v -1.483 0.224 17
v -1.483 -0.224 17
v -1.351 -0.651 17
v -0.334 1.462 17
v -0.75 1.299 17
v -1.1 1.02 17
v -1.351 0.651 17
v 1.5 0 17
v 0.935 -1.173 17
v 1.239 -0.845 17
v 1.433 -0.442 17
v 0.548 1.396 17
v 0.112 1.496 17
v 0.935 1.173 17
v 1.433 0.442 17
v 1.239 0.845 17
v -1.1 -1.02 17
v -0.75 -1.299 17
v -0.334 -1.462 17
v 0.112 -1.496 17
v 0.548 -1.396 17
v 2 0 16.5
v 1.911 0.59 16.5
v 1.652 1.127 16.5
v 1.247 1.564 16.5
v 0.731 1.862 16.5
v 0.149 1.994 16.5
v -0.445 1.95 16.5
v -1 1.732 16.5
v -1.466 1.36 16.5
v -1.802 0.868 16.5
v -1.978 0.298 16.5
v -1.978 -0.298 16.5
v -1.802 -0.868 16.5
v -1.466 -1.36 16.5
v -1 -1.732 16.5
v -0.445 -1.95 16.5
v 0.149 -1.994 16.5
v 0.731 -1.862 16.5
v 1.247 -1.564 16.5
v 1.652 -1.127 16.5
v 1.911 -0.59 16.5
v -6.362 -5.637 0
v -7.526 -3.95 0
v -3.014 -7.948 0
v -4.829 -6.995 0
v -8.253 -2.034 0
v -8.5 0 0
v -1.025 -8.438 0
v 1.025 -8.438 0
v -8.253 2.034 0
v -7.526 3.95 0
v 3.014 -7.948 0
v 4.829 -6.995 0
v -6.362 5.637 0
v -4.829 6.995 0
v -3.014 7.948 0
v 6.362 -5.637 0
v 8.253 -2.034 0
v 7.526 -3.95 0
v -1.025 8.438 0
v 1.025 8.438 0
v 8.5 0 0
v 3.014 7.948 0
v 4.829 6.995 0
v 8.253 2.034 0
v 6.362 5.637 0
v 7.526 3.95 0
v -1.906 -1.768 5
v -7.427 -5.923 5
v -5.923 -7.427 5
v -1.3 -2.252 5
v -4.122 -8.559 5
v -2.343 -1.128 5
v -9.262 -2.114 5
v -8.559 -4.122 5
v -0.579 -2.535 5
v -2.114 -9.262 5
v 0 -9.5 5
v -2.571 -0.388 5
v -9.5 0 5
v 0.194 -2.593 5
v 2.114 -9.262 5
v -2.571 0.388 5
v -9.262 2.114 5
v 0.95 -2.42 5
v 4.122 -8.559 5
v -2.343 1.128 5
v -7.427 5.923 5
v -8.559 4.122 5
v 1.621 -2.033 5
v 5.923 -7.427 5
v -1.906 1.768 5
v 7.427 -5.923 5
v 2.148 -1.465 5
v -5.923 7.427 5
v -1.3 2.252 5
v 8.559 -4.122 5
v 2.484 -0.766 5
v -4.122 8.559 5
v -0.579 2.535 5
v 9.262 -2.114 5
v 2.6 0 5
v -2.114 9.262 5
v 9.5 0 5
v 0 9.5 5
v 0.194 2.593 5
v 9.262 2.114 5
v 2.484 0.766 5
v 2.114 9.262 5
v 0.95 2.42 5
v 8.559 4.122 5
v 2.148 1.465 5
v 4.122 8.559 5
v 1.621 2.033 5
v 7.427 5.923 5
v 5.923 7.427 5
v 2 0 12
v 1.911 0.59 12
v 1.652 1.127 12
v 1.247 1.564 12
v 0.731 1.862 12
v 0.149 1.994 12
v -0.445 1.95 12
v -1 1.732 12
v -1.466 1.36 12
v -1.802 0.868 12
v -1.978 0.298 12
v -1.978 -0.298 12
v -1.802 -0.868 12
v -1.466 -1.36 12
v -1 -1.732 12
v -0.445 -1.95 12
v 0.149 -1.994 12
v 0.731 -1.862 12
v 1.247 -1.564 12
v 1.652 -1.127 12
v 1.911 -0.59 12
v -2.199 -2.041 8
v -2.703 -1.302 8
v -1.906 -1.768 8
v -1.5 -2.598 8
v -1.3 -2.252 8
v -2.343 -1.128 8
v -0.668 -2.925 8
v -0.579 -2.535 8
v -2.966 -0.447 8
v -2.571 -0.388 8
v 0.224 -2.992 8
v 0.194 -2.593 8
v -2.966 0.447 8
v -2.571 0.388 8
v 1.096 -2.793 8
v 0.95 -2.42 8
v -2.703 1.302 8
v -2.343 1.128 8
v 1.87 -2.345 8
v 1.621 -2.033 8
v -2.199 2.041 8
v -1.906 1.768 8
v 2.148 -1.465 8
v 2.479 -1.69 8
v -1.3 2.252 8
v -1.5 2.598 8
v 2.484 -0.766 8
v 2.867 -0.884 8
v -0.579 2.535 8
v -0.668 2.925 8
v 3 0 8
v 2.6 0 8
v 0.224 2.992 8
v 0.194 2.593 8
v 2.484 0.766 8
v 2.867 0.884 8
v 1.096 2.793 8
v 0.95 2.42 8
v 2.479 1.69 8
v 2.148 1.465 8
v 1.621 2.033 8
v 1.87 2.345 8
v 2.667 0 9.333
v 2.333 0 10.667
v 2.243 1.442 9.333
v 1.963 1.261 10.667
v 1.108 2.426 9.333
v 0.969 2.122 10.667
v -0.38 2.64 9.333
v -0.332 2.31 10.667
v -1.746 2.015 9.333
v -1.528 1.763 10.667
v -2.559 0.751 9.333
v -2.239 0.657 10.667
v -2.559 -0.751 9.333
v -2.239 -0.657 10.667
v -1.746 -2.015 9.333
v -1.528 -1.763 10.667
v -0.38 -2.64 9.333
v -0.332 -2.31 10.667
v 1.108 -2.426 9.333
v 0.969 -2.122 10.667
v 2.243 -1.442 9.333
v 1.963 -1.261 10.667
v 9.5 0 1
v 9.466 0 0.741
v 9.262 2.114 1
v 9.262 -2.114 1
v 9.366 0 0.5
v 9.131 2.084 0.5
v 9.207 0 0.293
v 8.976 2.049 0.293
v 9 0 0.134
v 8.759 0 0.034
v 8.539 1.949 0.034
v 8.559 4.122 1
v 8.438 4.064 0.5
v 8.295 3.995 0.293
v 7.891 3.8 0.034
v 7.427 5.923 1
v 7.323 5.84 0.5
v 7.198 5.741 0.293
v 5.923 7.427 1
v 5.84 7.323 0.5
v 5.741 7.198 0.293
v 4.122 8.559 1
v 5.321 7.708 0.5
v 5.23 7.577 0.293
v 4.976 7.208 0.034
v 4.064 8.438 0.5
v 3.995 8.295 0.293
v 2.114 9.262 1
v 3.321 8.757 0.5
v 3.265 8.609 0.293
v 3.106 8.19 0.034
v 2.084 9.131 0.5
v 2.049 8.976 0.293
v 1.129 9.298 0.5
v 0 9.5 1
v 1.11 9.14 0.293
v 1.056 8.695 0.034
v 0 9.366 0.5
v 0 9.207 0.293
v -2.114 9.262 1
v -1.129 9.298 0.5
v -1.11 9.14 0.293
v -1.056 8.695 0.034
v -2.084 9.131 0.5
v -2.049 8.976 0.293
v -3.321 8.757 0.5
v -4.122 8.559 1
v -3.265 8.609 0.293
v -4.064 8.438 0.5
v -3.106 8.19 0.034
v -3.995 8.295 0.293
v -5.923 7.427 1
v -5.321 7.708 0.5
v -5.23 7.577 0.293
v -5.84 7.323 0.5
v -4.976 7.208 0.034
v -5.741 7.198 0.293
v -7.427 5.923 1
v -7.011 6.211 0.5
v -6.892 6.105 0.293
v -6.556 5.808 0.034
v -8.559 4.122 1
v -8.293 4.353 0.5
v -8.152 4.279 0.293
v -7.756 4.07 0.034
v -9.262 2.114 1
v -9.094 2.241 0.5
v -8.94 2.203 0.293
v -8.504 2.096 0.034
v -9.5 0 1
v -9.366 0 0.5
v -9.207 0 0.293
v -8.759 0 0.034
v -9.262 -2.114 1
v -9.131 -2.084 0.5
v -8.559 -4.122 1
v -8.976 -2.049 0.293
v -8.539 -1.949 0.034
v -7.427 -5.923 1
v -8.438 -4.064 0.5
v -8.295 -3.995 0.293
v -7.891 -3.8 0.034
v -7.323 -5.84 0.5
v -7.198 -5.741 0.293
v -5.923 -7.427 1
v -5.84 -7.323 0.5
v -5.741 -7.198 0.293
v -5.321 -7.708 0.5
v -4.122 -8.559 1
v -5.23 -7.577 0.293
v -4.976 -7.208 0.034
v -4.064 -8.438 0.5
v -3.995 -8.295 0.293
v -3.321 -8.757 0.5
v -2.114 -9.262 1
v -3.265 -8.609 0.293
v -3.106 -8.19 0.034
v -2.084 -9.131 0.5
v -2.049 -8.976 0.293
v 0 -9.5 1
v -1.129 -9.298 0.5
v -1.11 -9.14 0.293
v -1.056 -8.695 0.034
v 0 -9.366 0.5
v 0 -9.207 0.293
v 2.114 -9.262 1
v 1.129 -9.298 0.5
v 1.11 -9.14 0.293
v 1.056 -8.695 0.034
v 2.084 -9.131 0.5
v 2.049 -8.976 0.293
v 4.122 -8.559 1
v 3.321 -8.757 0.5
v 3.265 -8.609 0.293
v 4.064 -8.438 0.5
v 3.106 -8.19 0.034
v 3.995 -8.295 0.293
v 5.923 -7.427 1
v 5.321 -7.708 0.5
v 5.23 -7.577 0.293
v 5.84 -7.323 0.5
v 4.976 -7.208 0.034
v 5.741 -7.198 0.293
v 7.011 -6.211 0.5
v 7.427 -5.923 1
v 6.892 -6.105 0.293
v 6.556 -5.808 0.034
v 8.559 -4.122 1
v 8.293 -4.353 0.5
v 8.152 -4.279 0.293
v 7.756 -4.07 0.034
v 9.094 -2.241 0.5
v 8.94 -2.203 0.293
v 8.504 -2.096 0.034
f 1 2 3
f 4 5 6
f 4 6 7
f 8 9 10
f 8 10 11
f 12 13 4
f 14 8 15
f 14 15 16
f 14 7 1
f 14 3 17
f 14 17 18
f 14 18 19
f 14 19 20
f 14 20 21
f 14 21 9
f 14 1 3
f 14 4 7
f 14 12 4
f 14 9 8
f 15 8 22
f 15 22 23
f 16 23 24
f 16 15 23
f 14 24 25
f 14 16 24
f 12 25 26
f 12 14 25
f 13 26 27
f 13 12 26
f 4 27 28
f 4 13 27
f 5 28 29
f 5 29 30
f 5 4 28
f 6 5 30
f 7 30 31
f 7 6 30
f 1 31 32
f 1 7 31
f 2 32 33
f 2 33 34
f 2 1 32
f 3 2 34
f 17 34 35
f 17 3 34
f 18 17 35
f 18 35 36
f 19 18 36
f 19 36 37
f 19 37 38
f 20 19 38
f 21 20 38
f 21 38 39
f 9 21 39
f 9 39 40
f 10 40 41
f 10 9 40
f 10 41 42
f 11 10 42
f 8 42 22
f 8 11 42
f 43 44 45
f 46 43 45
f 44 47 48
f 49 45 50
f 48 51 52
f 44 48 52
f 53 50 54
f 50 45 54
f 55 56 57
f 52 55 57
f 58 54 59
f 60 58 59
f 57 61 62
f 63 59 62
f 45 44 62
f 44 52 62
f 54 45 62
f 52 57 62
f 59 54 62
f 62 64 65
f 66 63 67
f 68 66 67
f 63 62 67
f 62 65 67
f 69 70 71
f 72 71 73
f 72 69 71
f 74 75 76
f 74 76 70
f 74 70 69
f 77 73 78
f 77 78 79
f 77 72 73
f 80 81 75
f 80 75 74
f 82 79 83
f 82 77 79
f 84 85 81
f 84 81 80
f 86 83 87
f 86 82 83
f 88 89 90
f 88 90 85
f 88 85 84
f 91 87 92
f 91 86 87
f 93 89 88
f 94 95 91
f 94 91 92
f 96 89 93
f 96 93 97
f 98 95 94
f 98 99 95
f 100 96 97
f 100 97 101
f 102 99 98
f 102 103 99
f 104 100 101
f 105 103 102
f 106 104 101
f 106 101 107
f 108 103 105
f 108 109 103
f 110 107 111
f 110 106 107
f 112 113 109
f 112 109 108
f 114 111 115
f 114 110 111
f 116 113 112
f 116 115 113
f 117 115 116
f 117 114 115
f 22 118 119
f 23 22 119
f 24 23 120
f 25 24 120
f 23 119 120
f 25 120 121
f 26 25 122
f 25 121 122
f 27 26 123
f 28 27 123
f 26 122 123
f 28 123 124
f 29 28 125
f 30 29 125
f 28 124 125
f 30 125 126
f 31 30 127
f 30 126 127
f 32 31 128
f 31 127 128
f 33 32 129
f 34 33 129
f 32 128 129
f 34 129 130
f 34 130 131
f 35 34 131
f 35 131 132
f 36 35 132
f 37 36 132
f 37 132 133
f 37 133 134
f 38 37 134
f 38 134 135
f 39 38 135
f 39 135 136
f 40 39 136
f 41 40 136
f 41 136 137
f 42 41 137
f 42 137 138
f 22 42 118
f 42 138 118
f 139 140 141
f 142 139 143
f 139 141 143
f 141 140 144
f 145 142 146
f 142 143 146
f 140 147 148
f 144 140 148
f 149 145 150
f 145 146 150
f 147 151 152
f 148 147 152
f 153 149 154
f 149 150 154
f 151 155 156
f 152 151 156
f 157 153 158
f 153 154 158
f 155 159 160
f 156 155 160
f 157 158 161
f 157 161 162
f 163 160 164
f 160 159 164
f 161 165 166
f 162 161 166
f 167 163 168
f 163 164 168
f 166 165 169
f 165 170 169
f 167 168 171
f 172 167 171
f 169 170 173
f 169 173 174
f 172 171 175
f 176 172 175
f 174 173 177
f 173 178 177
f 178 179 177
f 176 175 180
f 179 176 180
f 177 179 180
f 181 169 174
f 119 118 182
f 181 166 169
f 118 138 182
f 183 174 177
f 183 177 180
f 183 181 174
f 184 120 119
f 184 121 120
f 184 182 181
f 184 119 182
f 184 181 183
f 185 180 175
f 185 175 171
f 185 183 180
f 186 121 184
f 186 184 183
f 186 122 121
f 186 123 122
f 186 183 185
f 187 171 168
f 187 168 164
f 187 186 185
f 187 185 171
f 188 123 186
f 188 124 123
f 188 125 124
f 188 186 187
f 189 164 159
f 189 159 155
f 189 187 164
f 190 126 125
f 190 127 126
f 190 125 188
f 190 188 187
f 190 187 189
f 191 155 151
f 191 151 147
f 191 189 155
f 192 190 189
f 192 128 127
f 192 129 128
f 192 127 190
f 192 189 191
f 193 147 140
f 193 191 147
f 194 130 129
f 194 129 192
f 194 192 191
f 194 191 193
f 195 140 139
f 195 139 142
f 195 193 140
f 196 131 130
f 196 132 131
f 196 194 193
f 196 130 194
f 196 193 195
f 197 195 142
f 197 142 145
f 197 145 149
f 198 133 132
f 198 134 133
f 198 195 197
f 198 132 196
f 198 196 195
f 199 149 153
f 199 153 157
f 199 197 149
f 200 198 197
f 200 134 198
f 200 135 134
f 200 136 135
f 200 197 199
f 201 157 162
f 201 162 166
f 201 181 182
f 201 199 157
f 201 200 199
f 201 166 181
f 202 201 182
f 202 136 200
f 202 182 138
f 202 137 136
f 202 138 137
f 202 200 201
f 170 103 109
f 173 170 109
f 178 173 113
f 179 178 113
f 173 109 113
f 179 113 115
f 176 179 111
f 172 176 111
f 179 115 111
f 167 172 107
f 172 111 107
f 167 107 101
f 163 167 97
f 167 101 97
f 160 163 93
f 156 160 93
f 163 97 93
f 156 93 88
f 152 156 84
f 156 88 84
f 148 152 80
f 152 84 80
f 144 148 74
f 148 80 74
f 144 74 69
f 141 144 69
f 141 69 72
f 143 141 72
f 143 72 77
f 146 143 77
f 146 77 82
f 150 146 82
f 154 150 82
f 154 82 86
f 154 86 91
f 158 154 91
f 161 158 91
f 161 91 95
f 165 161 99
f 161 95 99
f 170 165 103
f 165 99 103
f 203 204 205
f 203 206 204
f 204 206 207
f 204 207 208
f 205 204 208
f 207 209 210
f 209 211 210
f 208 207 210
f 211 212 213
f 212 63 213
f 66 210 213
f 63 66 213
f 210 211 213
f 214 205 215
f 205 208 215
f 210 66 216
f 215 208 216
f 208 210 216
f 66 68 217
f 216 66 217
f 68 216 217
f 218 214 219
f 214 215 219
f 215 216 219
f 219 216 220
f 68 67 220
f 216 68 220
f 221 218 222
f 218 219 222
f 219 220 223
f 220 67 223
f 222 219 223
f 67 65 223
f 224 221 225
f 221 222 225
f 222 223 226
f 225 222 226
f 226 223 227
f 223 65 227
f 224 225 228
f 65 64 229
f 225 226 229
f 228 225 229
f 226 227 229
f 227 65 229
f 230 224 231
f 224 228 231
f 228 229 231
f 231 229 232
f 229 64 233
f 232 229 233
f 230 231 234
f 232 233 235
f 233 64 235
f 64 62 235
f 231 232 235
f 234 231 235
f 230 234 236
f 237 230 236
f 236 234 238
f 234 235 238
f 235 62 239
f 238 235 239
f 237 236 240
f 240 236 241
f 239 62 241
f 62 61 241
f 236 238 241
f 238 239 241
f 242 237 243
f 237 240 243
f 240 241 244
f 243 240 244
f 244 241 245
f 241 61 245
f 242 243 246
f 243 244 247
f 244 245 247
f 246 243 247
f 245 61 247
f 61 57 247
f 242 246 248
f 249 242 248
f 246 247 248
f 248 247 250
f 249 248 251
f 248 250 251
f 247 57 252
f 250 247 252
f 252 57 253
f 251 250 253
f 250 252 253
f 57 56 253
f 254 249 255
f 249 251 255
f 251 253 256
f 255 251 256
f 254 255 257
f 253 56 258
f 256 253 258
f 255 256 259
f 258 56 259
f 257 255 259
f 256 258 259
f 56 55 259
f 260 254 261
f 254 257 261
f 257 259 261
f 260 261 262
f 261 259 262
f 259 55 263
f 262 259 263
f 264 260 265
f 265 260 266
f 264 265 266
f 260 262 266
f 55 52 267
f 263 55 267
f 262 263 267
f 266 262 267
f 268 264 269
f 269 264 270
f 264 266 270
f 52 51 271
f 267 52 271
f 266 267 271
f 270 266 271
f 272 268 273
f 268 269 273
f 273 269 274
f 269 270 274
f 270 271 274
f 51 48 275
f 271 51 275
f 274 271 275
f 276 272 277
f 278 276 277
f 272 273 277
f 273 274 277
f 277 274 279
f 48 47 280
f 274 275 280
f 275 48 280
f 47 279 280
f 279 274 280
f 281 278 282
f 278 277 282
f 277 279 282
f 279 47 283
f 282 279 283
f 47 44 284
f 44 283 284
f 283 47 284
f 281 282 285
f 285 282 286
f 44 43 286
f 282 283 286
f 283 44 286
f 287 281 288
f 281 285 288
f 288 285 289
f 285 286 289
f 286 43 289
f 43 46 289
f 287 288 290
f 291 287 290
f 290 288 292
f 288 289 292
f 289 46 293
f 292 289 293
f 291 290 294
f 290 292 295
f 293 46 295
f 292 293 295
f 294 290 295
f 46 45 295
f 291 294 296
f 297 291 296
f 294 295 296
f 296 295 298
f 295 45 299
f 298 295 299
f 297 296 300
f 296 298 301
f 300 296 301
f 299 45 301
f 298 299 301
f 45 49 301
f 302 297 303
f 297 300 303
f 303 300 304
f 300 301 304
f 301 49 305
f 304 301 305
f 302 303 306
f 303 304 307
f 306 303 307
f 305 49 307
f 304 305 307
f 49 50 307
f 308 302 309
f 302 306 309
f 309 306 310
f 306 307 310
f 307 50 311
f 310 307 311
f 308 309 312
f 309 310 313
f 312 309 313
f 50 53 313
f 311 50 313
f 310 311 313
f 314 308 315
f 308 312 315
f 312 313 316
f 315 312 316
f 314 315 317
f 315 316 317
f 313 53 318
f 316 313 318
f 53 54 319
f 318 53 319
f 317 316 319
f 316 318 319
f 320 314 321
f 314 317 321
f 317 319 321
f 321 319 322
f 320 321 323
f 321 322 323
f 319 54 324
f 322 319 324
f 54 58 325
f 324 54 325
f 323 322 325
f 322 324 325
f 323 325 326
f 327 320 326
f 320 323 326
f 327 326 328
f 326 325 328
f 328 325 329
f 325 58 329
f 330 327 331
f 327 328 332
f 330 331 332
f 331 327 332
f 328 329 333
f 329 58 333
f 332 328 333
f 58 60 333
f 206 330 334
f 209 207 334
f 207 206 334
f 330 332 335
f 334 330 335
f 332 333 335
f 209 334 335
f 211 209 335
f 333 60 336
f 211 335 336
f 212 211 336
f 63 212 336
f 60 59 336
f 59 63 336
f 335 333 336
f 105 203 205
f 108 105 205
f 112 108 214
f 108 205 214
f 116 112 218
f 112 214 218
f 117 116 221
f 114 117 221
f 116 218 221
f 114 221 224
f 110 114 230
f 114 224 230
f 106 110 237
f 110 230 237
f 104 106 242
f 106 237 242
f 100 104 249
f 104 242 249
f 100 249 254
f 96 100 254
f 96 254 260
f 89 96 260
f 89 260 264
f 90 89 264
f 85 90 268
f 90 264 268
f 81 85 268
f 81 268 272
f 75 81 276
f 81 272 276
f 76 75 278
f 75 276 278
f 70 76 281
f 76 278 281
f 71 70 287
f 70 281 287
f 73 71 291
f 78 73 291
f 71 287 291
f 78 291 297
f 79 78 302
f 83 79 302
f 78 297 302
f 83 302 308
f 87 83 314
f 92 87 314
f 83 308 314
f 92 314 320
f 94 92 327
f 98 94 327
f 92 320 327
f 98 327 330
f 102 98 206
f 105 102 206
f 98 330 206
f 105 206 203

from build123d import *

# Parameters (mm, degrees)
F0_R      = 9.5
F1_DEPTH  = 5
F2_R      = 1
F4_R      = 3
F6_R      = 2
F8_R      = 2.6
F9_DEPTH  = 3
F10_DEPTH = 5
F11_SIZE  = 0.5


with BuildPart() as f1:
    # F0 (on Top) → F1 (new body)
    with BuildSketch(Plane.XY):
        Circle(F0_R)
    extrude(amount=F1_DEPTH)

    # F2
    f2_edges = [f1.edges().sort_by_distance(p)[0] for p in [
        (-9.5, 0, 0),
    ]]
    fillet(f2_edges, radius=F2_R)



with BuildPart() as f7:
    # F4 (on offset) → F7 section 0
    with BuildSketch(Plane.XY.offset(8)):
        Circle(F4_R)
    # F6 (on offset) → F7 section 1
    with BuildSketch(Plane.XY.offset(12)):
        Circle(F6_R)
    loft()


with BuildPart() as f1_1:
    add(f1.part)

    add(f7.part)  # F9 merges F7
    # F8 (on face) → F9 (join)
    with BuildSketch(Plane.XY.offset(5)):
        Circle(F8_R)
    extrude(amount=F9_DEPTH)

    # F10 (add): a face of the model
    f10_faces = [f1_1.faces().sort_by_distance(p)[0] for p in [
        (0, 0, 12),
    ]]
    extrude(f10_faces, amount=F10_DEPTH)

    # F11
    f11_edges = [f1_1.edges().sort_by_distance(p)[0] for p in [
        (-2, 0, 17),
    ]]
    chamfer(f11_edges, length=F11_SIZE)


solid = f1_1.part
